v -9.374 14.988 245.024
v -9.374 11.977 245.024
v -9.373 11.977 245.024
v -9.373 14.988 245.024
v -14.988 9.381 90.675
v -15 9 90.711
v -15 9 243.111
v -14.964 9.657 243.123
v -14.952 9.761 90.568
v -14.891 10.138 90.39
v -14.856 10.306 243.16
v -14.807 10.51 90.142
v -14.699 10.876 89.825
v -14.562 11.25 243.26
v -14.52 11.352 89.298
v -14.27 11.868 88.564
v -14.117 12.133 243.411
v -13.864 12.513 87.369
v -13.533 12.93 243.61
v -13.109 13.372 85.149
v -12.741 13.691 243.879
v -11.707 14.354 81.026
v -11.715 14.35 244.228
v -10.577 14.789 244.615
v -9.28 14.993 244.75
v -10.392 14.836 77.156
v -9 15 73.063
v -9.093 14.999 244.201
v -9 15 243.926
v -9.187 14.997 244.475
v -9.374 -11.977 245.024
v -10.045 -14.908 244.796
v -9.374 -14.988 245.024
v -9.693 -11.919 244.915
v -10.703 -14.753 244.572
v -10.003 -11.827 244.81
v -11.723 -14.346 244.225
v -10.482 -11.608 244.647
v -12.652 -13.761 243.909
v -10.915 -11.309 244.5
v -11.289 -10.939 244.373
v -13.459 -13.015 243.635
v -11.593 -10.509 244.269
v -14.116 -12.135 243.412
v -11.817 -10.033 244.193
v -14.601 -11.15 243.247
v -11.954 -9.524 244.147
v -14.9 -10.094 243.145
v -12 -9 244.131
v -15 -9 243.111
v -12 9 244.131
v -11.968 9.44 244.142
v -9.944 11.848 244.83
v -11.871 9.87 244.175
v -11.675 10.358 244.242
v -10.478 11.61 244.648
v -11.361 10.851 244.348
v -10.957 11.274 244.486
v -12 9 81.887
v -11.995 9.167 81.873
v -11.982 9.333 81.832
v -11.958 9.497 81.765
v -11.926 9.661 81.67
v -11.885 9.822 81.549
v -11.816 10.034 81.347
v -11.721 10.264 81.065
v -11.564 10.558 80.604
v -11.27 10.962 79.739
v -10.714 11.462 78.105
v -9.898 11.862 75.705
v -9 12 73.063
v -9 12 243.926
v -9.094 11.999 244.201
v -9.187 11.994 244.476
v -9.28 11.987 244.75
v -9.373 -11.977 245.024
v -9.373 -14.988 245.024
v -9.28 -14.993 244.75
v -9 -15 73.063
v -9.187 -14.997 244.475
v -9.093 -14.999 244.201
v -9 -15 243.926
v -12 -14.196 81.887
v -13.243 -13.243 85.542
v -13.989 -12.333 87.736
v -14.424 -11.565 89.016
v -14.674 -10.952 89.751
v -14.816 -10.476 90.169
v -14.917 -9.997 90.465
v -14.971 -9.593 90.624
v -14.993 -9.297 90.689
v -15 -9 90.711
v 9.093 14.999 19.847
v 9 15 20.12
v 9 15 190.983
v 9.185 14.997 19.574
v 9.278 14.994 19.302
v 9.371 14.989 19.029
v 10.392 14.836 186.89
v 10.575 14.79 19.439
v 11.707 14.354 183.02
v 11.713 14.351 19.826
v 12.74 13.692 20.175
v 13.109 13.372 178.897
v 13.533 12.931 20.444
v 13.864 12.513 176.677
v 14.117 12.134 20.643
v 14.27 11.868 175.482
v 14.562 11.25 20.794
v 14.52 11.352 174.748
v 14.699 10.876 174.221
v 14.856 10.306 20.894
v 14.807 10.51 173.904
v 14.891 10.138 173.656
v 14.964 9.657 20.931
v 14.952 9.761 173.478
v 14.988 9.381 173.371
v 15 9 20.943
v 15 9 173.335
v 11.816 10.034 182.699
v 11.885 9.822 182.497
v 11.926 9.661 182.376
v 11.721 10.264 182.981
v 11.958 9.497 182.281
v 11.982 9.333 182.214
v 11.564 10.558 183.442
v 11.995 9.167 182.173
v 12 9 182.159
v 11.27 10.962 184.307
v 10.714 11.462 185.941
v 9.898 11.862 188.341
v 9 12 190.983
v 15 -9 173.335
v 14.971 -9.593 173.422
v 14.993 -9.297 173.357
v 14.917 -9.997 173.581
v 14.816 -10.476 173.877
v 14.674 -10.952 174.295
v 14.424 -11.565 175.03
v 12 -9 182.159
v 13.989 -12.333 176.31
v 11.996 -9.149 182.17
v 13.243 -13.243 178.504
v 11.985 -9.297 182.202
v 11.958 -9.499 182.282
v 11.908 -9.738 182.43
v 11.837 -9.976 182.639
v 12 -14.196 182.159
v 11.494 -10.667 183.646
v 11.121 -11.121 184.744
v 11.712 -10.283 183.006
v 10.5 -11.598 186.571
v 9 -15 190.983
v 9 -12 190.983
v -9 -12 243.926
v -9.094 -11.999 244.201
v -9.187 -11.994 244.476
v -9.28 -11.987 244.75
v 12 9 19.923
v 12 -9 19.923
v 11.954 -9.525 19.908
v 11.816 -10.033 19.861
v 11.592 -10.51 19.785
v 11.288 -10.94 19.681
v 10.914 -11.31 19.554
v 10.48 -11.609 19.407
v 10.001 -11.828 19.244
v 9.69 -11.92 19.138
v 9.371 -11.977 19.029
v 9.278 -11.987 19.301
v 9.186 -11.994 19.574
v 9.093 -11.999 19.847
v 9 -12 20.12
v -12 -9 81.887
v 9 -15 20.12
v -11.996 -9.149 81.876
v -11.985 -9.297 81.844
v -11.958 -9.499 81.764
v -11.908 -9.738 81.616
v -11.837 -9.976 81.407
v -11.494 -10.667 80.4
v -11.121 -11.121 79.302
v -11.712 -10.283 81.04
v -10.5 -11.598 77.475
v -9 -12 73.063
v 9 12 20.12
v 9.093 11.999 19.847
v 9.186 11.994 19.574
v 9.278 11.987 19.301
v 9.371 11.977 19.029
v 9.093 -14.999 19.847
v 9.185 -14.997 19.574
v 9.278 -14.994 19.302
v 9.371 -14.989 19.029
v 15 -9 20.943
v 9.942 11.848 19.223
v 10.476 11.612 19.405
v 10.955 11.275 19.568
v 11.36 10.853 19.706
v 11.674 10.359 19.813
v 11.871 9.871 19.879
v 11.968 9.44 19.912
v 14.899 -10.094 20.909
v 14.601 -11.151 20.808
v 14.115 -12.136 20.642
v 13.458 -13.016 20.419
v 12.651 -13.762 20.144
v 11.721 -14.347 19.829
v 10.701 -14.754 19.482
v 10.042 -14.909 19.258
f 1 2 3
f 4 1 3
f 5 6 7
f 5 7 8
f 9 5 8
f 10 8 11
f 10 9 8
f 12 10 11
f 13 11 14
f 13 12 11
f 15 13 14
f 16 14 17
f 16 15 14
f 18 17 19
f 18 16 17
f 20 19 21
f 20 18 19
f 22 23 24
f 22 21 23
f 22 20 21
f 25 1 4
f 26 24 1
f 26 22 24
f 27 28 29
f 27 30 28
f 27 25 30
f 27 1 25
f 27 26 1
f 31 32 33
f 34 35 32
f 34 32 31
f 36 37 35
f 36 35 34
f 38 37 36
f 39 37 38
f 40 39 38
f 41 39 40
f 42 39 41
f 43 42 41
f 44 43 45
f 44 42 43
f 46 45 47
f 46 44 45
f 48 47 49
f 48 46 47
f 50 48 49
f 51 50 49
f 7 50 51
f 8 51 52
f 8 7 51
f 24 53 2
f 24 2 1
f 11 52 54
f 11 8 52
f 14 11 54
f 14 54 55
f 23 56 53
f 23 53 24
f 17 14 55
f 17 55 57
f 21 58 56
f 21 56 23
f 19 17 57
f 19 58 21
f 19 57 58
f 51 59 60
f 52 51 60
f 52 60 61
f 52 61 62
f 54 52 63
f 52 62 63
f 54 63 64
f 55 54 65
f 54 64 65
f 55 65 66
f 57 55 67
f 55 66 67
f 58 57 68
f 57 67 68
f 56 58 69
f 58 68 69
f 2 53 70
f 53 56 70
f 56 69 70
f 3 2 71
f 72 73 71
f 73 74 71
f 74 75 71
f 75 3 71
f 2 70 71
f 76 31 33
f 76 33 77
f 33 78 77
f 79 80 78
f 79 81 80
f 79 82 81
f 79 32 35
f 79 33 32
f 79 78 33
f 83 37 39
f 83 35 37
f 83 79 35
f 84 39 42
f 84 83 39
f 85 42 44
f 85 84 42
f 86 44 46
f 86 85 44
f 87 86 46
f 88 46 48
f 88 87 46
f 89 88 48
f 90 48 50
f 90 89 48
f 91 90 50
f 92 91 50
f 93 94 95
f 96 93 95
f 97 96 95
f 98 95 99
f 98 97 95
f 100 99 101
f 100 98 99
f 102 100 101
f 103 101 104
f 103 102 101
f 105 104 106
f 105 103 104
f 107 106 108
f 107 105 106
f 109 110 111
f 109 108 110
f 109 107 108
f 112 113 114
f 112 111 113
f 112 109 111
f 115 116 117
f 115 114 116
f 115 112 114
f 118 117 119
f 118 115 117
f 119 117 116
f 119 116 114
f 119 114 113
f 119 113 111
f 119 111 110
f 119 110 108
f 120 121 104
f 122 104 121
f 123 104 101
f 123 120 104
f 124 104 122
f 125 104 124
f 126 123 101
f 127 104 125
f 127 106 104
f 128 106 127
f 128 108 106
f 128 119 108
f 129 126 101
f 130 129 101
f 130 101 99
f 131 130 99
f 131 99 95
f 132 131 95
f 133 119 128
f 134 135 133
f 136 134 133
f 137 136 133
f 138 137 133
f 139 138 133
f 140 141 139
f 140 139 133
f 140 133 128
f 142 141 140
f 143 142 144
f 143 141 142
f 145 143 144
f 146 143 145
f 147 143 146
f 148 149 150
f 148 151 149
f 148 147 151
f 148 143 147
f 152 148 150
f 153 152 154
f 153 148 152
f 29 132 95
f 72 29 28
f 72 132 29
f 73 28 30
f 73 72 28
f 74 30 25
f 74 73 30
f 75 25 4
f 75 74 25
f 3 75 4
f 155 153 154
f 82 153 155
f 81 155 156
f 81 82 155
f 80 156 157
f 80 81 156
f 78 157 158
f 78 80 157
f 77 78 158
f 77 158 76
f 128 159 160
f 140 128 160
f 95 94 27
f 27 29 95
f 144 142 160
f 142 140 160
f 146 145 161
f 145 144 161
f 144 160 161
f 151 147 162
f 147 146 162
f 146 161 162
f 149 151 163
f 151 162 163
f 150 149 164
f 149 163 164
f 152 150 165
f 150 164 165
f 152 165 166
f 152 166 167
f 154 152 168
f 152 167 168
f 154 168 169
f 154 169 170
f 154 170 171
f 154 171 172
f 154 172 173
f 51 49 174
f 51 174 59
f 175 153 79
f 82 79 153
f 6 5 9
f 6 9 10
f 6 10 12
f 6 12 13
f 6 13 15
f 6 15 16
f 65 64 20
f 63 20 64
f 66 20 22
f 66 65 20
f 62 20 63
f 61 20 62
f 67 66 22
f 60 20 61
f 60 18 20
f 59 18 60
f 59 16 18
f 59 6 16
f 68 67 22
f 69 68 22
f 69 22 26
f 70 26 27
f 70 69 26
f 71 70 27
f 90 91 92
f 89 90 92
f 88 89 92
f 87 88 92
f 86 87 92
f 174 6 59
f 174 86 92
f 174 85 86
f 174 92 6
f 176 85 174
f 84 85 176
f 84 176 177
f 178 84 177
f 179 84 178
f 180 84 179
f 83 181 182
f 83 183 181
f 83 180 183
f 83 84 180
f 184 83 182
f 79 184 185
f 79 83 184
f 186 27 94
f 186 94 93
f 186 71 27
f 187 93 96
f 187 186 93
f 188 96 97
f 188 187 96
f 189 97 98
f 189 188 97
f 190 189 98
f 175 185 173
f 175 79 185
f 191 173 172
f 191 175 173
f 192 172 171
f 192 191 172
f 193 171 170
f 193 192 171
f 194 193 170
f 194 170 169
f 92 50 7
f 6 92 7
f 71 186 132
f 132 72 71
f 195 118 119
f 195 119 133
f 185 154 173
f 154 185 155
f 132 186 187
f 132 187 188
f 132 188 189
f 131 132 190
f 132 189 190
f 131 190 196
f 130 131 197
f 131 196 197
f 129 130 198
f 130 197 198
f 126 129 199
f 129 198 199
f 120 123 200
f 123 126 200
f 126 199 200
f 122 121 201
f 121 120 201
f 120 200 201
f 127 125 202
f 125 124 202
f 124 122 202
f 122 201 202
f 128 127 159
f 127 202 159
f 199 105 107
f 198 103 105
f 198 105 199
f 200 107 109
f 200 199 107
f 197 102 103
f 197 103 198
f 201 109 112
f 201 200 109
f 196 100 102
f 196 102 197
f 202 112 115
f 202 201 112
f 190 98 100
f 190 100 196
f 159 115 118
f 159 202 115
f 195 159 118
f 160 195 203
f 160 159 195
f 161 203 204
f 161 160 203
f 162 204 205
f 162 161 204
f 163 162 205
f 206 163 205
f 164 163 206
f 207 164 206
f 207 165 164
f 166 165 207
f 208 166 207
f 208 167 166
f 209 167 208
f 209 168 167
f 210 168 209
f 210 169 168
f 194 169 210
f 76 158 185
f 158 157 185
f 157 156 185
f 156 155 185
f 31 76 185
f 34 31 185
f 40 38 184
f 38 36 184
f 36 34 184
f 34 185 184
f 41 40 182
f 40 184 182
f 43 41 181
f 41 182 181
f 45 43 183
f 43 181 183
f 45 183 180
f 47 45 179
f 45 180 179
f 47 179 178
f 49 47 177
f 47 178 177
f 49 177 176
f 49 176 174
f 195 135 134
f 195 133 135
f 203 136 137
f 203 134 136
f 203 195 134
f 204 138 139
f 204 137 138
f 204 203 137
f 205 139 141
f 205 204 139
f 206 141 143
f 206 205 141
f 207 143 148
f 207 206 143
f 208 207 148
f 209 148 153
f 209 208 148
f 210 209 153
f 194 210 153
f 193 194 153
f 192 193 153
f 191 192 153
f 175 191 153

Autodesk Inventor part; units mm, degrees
ref_plane "Start Plane" through (0, 0, 19.0291) normal (0, 0, 1) x (1, 0, 0)
ref_plane "End Plane" through (0, 0, 245.024) normal (0, 0, 1) x (1, 0, 0)
sketch "Sketch" plane through (0, 0, 0) normal (0, 0, 1) x (1, 0, 0)
  line L0 (-15, -9) -> (-15, 9)
  line L1 (-9, 15) -> (9, 15)
  line L2 (15, 9) -> (15, -9)
  line L3 (9, -15) -> (-9, -15)
  arc A0 (-15, -9) -> (-9, -15) centre (-9, -9) ccw
  arc A1 (-9, 15) -> (-15, 9) centre (-9, 9) ccw
  arc A2 (15, 9) -> (9, 15) centre (9, 9) ccw
  arc A3 (9, -15) -> (15, -9) centre (9, -9) ccw
  arc A4 (-9, 12) -> (-12, 9) centre (-9, 9) ccw
  line L4 (-9, 12) -> (9, 12)
  arc A5 (12, 9) -> (9, 12) centre (9, 9) ccw
  line L5 (12, 9) -> (12, -9)
  arc A6 (9, -12) -> (12, -9) centre (9, -9) ccw
  line L6 (9, -12) -> (-9, -12)
  arc A7 (-12, -9) -> (-9, -12) centre (-9, -9) ccw
  line L7 (-12, -9) -> (-12, 9)
  line L8 (0, 22.7397) -> (0, -22.7397) construction
  line L9 (-22.7397, 0) -> (22.7397, 0) construction
  dimension "d7" = 6
  dimension "d10" = 30
  dimension "d11" = 30
  dimension "d12" = 3
  dimension "d15" = 15
  dimension "d16" = 15
extrude "Body" add sketch "Sketch" along normal up to surface (225.9948 mm away) from surface at 19.0291
sketch "Sketch3" plane through (0, 0, 0) normal (0, 0, 1) x (1, 0, 0)
  line L0 (0, 0) -> (10, 0)
ref_plane "Work Plane3" through (0, 0, 0) normal (0, -1, 0) x (1, 0, 0)
ref_plane "Work Plane4" through (52.8262, -9, -108.7856) normal (-0.9468, 0, -0.3219) x (-0.3219, 0, 0.9468)
split "Split1" plane through (52.8262, -9, -108.7856) removes the side toward (-0.9468, 0, -0.3219)
ref_plane "Work Plane5" through (75.6449, 9, 41.5617) normal (0.3219, 0, -0.9468) x (-0.9468, 0, -0.3219)
split "Split2" plane through (75.6449, 9, 41.5617) removes the side toward (0.3219, 0, -0.9468)
ref_plane "Work Plane6" through (-14.2016, 9, 259.2256) normal (0.9468, 0, 0.3219) x (0.3219, 0, -0.9468)
split "Split3" plane through (-14.2016, 9, 259.2256) removes the side toward (0.9468, 0, 0.3219)
ref_plane "Work Plane7" through (4.8284, -9, 249.8524) normal (-0.3219, 0, 0.9468) x (0.9468, 0, 0.3219)
split "Split4" plane through (4.8284, -9, 249.8524) removes the side toward (-0.3219, 0, 0.9468)
sketch "Sketch4" plane through (0, 0, 0) normal (0, -1, 0) x (1, 0, 0)
  line L0 (-2, 19.0291) -> (12, 19.0291) projected
  line L1 (-2, 245.024) -> (12, 245.024) projected
  dimension "d18" = 225.9948
equation "\"d7\" = G_IR"
equation "\"d10\" = G_H"
equation "\"d11\" = G_W"
equation "\"d12\" = G_T"
equation "\"d15\" = 0.5 * d10"
equation "\"d16\" = 0.5 * d11"
equation "\"d3\" = G_L"
equation "\"G_W\" = 30"
equation "\"G_H\" = 30"
equation "\"G_T\" = 3"
equation "\"G_IR\" = 6"
equation "\"G_L\" = d18"
equation "\"G_OFFSET_START\" = -19.02914"
equation "\"G_OFFSET_END\" = -19.03004"
equation "\"d13\" = -G_OFFSET_START"
equation "\"d14\" = G_OFFSET_END + B_L"
equation "\"B_L\" = 264.05402"
properties part number "DIN EN 10219-2 - 30 x 30 x 3  - 225.99" material "Steel, Mild"
